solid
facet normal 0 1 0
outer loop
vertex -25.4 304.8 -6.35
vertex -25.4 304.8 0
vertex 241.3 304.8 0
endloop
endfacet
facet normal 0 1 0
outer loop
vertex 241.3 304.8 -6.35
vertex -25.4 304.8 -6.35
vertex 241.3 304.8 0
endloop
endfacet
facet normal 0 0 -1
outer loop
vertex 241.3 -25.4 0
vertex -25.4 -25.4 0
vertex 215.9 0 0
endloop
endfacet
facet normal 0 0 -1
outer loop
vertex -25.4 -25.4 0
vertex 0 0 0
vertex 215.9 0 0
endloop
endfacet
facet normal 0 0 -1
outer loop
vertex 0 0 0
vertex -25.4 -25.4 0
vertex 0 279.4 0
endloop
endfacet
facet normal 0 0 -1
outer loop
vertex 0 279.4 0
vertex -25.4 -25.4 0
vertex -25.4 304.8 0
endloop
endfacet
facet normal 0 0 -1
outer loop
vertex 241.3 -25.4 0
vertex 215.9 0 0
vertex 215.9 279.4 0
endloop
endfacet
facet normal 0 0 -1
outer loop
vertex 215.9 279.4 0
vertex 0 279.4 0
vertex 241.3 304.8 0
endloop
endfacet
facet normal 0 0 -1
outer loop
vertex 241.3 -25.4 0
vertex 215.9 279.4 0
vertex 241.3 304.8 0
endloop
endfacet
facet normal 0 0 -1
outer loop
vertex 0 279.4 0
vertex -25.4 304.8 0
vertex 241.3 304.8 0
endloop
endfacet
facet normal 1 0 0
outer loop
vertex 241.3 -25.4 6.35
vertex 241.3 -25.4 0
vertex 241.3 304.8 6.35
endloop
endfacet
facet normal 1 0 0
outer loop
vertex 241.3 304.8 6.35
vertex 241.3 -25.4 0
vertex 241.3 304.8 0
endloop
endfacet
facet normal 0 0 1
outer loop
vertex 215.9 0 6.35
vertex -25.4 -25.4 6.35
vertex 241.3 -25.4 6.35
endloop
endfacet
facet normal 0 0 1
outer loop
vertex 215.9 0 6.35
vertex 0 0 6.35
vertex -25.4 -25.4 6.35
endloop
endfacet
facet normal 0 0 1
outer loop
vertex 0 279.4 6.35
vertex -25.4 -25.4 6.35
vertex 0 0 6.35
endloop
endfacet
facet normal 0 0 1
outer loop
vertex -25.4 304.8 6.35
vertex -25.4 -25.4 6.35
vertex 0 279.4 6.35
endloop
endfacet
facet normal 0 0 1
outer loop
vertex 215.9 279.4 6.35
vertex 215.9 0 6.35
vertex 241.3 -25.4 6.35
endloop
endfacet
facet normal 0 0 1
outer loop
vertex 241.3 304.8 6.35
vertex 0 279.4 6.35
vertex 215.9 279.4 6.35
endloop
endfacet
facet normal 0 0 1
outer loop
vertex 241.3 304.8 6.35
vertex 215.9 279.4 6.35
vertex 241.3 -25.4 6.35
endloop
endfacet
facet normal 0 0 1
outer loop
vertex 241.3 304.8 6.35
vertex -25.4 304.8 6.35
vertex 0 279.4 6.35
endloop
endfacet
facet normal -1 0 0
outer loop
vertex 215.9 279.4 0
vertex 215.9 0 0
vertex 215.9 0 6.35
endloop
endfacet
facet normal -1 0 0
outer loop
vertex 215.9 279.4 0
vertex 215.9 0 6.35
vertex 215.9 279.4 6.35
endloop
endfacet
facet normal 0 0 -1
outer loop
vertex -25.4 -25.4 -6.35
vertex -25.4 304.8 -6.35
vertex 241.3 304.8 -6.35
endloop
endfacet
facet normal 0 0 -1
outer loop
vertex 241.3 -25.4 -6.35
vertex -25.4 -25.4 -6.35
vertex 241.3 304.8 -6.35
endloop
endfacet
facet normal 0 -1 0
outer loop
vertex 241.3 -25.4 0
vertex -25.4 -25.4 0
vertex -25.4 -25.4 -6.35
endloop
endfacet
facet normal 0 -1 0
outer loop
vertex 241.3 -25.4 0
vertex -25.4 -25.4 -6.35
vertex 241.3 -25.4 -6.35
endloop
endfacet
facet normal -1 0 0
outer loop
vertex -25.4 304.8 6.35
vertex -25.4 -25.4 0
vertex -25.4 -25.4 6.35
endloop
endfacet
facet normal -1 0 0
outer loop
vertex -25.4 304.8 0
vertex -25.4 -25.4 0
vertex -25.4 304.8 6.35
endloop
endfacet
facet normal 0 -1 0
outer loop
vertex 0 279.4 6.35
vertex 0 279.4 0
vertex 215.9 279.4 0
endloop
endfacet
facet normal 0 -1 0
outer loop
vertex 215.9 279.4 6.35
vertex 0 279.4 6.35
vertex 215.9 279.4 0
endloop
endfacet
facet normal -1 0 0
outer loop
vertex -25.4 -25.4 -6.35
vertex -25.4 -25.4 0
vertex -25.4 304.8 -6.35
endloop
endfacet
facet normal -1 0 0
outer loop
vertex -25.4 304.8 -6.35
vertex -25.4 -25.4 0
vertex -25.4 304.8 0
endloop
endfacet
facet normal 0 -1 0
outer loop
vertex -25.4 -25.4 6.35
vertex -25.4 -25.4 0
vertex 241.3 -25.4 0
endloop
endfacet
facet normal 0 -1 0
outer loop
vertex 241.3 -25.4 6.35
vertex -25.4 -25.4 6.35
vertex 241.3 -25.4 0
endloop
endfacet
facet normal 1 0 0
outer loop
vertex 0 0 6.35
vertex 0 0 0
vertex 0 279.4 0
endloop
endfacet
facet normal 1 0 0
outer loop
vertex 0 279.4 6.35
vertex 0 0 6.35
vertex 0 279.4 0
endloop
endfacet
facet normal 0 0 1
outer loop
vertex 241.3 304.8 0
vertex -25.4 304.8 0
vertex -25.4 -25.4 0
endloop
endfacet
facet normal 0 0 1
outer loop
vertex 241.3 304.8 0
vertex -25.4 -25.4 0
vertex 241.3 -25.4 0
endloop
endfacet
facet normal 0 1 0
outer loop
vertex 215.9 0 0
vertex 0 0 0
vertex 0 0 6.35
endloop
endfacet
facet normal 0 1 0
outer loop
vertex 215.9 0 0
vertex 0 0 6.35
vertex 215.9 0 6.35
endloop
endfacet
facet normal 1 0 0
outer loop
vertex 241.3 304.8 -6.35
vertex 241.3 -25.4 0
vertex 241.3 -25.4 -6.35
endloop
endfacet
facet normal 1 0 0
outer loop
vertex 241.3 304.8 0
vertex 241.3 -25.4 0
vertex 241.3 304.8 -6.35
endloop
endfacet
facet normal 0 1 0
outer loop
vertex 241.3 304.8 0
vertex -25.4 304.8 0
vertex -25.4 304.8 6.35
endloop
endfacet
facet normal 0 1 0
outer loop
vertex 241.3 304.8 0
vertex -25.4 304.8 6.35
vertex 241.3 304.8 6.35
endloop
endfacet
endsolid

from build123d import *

# Parameters (mm, degrees)
F0_W     = 266.7
F0_H     = 330.2
F0_W_2   = 215.9
F0_H_2   = 279.4
F1_DEPTH = 6.35
F2_DEPTH = 6.35


with BuildPart() as f1:
    # F0 (on Top) → F1 (new body)
    with BuildSketch(Plane.XY):
        with Locations((107.95, 139.7)):
            Rectangle(F0_W, F0_H)
        with Locations((107.95, 139.7)):
            Rectangle(F0_W_2, F0_H_2, mode=Mode.SUBTRACT)
        with Locations((107.95, 139.7)):
            Rectangle(F0_W_2, F0_H_2)
    extrude(amount=-F1_DEPTH)


with BuildPart() as f2:
    # F0 (on Top) → F2 (new body)
    with BuildSketch(Plane.XY):
        with Locations((107.95, 139.7)):
            Rectangle(F0_W, F0_H)
        with Locations((107.95, 139.7)):
            Rectangle(F0_W_2, F0_H_2, mode=Mode.SUBTRACT)
    extrude(amount=F2_DEPTH)


solid = Compound([f1.part, f2.part])
